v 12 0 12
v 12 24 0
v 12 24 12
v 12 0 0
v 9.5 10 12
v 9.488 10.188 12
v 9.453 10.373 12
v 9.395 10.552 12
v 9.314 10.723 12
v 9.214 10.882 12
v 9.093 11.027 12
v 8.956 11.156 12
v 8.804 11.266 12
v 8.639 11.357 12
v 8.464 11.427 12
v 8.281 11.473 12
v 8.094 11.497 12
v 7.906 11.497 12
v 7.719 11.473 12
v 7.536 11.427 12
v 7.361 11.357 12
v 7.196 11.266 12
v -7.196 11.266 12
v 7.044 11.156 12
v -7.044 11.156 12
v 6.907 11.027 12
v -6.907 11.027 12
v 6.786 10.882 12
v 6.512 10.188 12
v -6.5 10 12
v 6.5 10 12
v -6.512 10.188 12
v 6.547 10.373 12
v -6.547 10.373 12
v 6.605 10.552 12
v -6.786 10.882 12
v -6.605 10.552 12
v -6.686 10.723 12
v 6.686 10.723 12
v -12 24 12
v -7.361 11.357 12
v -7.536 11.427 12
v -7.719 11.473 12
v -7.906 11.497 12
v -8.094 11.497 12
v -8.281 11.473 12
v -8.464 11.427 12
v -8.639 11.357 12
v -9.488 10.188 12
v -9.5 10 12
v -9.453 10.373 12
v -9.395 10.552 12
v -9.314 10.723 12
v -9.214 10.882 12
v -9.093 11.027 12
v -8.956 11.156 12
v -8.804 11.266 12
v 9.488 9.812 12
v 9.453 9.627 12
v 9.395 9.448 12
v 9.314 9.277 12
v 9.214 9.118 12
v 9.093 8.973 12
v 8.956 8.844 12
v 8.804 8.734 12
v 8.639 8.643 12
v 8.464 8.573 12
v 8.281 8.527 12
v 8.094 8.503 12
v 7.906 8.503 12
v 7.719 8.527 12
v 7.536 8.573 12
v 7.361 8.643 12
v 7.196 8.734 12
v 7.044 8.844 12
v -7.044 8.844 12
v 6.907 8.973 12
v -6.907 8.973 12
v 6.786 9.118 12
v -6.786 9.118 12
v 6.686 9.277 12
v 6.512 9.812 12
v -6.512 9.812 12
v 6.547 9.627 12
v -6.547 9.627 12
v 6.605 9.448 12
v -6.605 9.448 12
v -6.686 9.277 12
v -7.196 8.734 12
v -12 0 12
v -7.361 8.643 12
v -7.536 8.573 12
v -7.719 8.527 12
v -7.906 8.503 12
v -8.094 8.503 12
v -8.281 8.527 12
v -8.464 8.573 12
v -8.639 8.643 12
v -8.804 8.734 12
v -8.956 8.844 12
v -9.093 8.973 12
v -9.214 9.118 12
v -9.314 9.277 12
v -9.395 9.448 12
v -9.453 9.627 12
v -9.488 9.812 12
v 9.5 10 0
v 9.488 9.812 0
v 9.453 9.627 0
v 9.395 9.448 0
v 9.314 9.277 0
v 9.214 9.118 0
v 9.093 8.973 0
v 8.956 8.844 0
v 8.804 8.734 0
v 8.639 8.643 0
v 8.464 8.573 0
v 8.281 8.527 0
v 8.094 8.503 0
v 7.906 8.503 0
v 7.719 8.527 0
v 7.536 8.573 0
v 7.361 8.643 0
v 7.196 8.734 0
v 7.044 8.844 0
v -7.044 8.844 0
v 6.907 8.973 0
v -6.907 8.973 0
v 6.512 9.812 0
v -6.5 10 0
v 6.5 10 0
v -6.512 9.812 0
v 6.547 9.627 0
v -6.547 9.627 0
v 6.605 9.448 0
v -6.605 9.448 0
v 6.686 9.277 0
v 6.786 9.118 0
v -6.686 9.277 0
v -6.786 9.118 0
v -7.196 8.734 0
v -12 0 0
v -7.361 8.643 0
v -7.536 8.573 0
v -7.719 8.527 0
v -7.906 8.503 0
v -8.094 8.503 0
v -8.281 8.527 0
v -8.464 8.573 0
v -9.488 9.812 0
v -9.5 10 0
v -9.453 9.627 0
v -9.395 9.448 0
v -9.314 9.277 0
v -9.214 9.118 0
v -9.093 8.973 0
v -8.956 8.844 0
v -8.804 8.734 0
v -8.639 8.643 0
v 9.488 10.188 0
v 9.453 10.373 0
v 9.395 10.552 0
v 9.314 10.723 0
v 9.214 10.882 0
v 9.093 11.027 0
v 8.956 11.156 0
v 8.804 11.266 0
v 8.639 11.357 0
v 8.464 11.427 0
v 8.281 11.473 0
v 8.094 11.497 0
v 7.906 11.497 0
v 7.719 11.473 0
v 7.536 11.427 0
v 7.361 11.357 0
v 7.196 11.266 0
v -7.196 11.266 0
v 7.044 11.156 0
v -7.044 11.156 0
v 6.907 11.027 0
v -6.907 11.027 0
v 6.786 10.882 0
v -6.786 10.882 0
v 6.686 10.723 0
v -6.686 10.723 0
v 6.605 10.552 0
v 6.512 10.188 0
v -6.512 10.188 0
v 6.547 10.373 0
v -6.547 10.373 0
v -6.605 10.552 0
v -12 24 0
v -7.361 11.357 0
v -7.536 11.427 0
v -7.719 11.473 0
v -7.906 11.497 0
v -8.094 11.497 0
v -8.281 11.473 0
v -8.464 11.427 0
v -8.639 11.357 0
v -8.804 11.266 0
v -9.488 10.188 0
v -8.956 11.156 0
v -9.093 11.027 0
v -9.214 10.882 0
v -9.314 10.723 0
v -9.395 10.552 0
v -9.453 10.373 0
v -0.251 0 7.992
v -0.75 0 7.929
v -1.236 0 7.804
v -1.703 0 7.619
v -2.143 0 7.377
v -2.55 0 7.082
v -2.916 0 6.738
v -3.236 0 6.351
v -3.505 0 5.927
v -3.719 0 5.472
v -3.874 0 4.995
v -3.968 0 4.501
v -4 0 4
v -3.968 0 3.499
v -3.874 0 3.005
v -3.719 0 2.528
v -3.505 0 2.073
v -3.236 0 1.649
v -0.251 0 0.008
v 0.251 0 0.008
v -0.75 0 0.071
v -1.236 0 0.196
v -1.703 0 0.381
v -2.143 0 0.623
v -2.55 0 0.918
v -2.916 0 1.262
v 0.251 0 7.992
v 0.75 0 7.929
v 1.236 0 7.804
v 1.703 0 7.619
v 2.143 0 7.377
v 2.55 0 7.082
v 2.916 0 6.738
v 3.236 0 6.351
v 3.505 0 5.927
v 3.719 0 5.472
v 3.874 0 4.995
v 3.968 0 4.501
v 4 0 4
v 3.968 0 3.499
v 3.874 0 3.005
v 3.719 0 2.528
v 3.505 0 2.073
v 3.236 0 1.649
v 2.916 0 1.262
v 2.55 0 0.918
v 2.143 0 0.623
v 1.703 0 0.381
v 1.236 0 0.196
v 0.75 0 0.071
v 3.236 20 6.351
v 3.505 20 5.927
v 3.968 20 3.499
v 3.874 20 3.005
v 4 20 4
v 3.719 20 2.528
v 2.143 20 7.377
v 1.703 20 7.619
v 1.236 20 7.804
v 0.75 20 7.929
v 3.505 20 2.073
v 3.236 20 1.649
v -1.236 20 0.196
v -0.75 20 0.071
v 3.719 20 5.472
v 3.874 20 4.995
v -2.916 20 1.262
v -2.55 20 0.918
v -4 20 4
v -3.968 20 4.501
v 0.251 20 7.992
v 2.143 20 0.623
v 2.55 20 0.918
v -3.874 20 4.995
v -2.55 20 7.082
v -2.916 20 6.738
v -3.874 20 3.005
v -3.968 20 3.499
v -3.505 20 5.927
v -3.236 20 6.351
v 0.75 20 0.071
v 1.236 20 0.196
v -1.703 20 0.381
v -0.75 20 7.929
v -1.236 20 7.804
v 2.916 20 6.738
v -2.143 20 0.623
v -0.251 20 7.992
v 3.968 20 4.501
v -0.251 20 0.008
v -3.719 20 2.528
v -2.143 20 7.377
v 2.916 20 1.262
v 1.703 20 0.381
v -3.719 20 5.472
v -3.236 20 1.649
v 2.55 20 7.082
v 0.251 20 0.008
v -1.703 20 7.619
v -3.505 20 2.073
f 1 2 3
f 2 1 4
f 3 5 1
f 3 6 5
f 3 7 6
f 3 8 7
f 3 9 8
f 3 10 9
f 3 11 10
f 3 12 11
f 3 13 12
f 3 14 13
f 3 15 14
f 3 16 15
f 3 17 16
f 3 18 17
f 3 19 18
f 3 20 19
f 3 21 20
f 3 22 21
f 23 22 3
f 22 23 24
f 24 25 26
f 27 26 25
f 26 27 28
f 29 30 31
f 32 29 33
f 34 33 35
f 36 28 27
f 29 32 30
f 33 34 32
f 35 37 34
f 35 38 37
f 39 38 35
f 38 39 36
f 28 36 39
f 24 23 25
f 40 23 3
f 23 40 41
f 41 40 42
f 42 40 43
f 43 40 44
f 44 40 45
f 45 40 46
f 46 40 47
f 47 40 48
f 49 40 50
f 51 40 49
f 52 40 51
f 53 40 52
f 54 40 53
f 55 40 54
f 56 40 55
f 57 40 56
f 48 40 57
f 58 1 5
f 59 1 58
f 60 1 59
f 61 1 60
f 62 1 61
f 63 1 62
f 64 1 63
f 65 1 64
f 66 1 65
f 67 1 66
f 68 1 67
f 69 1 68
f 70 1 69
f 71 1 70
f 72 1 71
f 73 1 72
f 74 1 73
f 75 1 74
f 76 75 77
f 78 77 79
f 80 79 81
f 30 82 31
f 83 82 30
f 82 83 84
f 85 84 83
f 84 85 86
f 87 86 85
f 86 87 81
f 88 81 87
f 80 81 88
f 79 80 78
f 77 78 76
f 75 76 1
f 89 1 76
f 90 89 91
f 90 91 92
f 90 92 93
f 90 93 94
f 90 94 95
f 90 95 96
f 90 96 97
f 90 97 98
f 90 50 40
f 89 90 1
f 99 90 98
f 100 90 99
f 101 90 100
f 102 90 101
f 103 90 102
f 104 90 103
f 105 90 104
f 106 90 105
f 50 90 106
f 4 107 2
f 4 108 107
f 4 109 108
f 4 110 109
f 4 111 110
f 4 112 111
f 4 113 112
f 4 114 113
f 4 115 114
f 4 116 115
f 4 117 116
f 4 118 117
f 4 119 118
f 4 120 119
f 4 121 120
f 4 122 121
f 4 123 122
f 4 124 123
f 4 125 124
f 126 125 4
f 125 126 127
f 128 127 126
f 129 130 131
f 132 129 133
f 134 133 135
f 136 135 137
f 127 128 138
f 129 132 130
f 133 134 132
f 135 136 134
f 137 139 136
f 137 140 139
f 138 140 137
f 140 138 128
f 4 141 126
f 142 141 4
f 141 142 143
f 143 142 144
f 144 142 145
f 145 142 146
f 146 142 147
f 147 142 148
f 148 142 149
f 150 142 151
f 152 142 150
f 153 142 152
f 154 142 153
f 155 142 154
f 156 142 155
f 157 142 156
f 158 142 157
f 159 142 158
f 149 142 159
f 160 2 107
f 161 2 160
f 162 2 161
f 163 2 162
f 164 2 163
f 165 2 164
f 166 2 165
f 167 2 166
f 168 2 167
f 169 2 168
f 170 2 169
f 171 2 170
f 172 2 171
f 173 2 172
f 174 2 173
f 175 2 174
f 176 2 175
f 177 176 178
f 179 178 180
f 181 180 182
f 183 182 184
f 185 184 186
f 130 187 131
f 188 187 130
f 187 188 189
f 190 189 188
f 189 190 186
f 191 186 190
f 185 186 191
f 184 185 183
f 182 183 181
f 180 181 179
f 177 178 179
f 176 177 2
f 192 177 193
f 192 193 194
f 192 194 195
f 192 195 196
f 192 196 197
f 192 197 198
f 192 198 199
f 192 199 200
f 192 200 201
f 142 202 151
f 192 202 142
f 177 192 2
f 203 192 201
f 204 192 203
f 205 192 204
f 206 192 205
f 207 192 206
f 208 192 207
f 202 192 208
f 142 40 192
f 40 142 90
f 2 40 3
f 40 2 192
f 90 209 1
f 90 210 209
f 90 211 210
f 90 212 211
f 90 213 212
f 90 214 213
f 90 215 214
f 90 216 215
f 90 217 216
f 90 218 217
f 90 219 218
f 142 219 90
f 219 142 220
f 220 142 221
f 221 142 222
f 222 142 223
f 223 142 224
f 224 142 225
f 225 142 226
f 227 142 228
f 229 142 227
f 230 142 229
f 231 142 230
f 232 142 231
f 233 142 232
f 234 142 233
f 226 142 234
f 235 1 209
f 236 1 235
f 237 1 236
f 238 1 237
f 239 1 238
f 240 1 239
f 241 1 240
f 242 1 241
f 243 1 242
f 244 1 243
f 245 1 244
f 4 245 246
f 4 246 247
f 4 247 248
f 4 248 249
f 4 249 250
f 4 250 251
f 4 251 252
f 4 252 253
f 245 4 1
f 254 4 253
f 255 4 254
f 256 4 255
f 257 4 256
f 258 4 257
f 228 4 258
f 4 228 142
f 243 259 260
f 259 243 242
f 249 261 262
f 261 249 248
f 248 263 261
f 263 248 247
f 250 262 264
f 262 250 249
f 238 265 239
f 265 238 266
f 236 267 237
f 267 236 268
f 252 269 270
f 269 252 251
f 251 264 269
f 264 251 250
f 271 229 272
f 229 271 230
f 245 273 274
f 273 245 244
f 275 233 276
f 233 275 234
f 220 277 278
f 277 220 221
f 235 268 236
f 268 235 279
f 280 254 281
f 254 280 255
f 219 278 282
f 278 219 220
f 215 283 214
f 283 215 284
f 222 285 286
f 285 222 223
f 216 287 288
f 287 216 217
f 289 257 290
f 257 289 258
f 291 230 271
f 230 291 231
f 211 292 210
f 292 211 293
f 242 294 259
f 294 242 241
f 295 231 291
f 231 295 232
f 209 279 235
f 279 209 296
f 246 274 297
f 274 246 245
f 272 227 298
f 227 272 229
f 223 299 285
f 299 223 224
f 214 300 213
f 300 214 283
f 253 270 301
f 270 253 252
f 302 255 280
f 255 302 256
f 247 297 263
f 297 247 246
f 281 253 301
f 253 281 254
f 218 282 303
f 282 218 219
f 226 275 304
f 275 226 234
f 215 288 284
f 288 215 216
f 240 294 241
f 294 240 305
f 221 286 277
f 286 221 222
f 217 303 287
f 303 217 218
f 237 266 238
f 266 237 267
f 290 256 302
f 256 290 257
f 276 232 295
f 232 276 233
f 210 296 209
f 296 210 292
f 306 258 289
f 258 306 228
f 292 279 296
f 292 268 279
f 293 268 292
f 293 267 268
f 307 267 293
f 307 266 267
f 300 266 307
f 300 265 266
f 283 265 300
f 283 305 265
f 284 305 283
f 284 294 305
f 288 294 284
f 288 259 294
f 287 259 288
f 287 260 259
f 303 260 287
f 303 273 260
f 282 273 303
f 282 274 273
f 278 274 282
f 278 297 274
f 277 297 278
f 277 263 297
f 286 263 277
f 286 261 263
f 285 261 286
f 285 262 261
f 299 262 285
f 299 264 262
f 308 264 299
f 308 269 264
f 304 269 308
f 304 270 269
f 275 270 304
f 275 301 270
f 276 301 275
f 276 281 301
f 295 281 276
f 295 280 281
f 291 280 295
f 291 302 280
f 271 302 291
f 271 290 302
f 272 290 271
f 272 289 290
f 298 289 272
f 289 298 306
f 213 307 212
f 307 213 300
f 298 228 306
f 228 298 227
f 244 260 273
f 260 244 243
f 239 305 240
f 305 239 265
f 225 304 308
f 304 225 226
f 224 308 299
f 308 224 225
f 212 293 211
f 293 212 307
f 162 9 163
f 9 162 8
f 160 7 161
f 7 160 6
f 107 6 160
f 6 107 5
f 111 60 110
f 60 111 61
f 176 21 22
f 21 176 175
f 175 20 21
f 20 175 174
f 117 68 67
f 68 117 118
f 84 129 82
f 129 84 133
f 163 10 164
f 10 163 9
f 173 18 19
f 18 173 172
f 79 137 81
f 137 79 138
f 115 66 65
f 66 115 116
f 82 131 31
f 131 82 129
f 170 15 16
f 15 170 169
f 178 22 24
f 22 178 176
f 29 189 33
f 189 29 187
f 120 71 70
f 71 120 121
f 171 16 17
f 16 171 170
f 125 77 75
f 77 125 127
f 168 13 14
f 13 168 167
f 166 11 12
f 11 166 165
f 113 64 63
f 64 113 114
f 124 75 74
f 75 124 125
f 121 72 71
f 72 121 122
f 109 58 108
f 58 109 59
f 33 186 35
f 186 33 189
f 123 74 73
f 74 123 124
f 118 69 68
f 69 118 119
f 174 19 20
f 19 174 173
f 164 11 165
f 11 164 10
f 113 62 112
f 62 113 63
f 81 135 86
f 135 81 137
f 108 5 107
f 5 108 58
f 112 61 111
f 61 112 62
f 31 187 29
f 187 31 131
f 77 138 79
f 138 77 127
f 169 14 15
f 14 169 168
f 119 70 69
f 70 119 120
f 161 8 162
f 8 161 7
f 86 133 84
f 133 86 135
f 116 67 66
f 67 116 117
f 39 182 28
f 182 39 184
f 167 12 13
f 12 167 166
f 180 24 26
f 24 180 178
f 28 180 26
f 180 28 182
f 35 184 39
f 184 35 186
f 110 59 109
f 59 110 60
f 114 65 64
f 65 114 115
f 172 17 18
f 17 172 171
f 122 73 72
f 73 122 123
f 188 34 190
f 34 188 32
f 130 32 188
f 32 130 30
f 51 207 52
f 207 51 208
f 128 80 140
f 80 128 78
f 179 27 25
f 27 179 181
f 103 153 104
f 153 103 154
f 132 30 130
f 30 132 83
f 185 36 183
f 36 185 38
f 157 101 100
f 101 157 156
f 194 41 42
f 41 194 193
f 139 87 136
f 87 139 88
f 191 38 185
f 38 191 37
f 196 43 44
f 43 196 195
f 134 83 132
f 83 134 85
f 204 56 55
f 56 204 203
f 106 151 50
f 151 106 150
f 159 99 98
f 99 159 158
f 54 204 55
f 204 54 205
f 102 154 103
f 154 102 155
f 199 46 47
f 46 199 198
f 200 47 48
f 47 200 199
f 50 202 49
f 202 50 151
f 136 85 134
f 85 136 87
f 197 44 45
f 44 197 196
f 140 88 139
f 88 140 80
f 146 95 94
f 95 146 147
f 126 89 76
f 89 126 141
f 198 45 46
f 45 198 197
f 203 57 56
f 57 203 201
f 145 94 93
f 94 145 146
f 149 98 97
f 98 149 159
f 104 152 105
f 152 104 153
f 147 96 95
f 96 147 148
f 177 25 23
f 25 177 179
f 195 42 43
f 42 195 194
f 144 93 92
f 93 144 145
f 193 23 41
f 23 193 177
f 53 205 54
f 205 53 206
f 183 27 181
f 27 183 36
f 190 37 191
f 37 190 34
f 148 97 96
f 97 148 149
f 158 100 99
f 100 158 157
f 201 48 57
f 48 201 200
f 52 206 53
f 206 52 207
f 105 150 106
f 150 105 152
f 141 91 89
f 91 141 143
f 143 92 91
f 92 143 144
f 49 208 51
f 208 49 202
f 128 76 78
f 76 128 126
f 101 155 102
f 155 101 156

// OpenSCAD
// units in mm
// y-rod holders (4x to be printed in case pockets_depth = 0)
include <../config.scad>
blockX = 24;
blockY = 24;
blockZ = 12;

difference(){
    translate([-blockX/2,0,0]) cube([blockX,blockY,blockZ]);
    translate([0,0,y_rod_pockets_size[0]/2]) rotate([-90,0,0]) cylinder(d=y_rod_pockets_size[0],h=y_rod_pockets_size[1]);
    translate([y_rod_holes_margin+y_rod_pockets_size[0]/2,y_rod_pockets_size[1]/2,0]) cylinder(r=m3_screw_radius,h=blockZ);
    translate([-y_rod_holes_margin-y_rod_pockets_size[0]/2,y_rod_pockets_size[1]/2,0]) cylinder(r=m3_screw_radius,h=blockZ);
}
